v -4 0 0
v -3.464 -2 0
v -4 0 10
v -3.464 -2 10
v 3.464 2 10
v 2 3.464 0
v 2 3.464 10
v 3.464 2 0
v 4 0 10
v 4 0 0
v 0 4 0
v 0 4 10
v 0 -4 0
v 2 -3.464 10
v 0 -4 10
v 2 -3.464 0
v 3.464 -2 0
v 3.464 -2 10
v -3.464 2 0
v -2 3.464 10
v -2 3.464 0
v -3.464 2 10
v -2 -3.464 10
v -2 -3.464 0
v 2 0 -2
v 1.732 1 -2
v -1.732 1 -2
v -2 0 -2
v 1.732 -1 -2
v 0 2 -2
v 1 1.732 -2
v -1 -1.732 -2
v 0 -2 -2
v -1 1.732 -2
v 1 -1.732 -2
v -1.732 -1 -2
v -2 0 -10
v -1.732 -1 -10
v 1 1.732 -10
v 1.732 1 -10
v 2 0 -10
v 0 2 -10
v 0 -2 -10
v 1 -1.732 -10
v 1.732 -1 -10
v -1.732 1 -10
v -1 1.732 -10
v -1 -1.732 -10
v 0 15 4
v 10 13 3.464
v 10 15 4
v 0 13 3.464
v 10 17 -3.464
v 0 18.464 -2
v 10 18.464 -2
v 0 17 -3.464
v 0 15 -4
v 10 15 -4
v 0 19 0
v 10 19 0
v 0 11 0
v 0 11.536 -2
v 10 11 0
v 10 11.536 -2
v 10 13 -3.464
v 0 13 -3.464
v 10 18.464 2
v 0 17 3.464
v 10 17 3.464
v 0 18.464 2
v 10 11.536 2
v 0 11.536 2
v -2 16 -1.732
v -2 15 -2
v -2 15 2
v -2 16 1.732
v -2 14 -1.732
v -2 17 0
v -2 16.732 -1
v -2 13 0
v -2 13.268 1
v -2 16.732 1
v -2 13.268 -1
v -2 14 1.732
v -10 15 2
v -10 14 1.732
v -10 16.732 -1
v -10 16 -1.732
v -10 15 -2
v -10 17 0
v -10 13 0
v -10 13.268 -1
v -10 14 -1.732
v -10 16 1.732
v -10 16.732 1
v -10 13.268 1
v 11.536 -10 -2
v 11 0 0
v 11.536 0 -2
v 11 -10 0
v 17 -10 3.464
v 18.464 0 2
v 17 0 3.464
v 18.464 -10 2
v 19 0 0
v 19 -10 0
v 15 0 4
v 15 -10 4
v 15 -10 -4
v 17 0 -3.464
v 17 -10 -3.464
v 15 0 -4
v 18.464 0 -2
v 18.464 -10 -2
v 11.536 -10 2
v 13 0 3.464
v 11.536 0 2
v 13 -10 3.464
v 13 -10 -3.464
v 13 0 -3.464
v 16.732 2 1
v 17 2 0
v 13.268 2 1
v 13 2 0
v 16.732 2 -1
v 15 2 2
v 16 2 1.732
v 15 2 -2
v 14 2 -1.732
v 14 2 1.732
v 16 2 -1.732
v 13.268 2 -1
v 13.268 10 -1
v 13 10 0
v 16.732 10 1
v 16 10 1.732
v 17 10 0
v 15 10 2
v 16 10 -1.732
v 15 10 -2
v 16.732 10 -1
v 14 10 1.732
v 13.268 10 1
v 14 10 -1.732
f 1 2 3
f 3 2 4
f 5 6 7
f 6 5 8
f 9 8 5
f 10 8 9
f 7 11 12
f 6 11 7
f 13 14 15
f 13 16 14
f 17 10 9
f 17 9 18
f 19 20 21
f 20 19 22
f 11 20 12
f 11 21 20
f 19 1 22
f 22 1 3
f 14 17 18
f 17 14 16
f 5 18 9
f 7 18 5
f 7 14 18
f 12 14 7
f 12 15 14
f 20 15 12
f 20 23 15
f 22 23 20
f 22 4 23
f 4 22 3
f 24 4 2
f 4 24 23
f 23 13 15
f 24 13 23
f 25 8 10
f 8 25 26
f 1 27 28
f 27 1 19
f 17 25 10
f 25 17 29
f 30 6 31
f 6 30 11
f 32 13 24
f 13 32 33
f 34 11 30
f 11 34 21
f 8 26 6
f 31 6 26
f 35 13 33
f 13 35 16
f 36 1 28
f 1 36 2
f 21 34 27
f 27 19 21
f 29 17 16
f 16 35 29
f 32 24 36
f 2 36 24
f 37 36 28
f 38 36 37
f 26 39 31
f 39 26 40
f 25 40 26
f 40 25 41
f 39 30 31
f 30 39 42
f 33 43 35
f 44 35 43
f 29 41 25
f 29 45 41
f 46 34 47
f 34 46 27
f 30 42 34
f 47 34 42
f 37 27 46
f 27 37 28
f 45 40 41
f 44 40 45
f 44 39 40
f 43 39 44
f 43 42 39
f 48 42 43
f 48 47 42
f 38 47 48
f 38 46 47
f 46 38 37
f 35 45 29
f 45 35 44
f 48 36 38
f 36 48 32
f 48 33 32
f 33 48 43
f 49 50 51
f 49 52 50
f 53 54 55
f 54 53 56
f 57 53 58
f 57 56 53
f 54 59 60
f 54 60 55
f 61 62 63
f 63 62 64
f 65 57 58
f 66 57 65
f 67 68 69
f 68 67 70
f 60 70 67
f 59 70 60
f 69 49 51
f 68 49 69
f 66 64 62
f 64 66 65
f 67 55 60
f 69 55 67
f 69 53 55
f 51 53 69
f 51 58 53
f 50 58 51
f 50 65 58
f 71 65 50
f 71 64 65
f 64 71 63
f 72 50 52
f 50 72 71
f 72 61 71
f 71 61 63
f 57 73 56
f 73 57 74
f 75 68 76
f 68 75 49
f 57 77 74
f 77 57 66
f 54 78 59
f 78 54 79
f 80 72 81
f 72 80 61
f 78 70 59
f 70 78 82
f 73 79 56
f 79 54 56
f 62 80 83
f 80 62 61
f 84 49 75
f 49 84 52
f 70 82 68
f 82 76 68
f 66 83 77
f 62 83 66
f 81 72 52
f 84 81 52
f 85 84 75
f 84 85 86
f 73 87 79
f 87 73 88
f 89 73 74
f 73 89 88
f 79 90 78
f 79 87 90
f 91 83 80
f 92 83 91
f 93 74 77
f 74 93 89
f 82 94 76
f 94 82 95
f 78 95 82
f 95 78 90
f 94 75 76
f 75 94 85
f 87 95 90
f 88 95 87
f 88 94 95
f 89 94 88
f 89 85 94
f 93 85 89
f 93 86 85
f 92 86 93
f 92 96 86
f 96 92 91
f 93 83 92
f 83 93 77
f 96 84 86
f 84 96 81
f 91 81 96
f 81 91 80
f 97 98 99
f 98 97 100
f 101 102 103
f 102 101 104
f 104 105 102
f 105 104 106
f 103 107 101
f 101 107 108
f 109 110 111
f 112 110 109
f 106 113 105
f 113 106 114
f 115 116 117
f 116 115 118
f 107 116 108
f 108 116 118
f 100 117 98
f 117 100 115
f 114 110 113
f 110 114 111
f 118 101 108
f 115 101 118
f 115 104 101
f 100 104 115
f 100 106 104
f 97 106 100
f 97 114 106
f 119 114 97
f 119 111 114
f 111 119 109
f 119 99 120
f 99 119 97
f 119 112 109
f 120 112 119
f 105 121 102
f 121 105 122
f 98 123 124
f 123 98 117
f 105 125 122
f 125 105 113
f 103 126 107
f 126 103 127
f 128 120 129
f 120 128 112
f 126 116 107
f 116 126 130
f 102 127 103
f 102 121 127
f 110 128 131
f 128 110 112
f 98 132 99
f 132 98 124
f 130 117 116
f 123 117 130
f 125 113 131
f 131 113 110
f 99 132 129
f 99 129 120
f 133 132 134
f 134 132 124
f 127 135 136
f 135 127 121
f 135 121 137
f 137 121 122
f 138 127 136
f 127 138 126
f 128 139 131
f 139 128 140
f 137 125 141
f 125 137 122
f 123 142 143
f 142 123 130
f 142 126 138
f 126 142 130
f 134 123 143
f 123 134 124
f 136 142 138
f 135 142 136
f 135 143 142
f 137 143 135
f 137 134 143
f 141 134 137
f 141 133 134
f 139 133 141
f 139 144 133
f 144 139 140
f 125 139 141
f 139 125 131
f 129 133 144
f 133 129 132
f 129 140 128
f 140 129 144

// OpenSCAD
// Vertical countersink with top of countersink centred on origin 
//
// od = overall diameter (for screw head)
// oh = overall height (screw + head +recesss)
// sd = screw diameter
// sh = screw height (to top of countersink)
module countersinkZ(od, oh, sd, sh)
{
    union()
    {
        intersection()
	    {
            translate([0,0,-sh]) cylinder(r=od/2, h=oh, $fn=12);
            translate([0,0,-od/2]) cylinder(r1=0, r2=oh+od/2, h=oh+od/2, $fn=12);
        }
    translate([0,0,-sh]) cylinder(r=sd/2, h=sh, $fn=12);
    }
}

// Countersink with screw directed along negative X-axis
module countersinkX(od, oh, sd, sh)
{
    rotate([0,90,0]) countersinkZ(od, oh, sd, sh);
}

// Countersink with screw directed along negative Y-axis
module countersinkY(od, oh, sd, sh)
{
    rotate([90,0,0]) countersinkZ(od, oh, sd, sh);
}


// Examples
countersinkZ(8, 20, 4, 10);

translate([0,15,0]) countersinkX(8, 20, 4, 10);

translate([15,0,0]) countersinkY(8, 20, 4, 10);
